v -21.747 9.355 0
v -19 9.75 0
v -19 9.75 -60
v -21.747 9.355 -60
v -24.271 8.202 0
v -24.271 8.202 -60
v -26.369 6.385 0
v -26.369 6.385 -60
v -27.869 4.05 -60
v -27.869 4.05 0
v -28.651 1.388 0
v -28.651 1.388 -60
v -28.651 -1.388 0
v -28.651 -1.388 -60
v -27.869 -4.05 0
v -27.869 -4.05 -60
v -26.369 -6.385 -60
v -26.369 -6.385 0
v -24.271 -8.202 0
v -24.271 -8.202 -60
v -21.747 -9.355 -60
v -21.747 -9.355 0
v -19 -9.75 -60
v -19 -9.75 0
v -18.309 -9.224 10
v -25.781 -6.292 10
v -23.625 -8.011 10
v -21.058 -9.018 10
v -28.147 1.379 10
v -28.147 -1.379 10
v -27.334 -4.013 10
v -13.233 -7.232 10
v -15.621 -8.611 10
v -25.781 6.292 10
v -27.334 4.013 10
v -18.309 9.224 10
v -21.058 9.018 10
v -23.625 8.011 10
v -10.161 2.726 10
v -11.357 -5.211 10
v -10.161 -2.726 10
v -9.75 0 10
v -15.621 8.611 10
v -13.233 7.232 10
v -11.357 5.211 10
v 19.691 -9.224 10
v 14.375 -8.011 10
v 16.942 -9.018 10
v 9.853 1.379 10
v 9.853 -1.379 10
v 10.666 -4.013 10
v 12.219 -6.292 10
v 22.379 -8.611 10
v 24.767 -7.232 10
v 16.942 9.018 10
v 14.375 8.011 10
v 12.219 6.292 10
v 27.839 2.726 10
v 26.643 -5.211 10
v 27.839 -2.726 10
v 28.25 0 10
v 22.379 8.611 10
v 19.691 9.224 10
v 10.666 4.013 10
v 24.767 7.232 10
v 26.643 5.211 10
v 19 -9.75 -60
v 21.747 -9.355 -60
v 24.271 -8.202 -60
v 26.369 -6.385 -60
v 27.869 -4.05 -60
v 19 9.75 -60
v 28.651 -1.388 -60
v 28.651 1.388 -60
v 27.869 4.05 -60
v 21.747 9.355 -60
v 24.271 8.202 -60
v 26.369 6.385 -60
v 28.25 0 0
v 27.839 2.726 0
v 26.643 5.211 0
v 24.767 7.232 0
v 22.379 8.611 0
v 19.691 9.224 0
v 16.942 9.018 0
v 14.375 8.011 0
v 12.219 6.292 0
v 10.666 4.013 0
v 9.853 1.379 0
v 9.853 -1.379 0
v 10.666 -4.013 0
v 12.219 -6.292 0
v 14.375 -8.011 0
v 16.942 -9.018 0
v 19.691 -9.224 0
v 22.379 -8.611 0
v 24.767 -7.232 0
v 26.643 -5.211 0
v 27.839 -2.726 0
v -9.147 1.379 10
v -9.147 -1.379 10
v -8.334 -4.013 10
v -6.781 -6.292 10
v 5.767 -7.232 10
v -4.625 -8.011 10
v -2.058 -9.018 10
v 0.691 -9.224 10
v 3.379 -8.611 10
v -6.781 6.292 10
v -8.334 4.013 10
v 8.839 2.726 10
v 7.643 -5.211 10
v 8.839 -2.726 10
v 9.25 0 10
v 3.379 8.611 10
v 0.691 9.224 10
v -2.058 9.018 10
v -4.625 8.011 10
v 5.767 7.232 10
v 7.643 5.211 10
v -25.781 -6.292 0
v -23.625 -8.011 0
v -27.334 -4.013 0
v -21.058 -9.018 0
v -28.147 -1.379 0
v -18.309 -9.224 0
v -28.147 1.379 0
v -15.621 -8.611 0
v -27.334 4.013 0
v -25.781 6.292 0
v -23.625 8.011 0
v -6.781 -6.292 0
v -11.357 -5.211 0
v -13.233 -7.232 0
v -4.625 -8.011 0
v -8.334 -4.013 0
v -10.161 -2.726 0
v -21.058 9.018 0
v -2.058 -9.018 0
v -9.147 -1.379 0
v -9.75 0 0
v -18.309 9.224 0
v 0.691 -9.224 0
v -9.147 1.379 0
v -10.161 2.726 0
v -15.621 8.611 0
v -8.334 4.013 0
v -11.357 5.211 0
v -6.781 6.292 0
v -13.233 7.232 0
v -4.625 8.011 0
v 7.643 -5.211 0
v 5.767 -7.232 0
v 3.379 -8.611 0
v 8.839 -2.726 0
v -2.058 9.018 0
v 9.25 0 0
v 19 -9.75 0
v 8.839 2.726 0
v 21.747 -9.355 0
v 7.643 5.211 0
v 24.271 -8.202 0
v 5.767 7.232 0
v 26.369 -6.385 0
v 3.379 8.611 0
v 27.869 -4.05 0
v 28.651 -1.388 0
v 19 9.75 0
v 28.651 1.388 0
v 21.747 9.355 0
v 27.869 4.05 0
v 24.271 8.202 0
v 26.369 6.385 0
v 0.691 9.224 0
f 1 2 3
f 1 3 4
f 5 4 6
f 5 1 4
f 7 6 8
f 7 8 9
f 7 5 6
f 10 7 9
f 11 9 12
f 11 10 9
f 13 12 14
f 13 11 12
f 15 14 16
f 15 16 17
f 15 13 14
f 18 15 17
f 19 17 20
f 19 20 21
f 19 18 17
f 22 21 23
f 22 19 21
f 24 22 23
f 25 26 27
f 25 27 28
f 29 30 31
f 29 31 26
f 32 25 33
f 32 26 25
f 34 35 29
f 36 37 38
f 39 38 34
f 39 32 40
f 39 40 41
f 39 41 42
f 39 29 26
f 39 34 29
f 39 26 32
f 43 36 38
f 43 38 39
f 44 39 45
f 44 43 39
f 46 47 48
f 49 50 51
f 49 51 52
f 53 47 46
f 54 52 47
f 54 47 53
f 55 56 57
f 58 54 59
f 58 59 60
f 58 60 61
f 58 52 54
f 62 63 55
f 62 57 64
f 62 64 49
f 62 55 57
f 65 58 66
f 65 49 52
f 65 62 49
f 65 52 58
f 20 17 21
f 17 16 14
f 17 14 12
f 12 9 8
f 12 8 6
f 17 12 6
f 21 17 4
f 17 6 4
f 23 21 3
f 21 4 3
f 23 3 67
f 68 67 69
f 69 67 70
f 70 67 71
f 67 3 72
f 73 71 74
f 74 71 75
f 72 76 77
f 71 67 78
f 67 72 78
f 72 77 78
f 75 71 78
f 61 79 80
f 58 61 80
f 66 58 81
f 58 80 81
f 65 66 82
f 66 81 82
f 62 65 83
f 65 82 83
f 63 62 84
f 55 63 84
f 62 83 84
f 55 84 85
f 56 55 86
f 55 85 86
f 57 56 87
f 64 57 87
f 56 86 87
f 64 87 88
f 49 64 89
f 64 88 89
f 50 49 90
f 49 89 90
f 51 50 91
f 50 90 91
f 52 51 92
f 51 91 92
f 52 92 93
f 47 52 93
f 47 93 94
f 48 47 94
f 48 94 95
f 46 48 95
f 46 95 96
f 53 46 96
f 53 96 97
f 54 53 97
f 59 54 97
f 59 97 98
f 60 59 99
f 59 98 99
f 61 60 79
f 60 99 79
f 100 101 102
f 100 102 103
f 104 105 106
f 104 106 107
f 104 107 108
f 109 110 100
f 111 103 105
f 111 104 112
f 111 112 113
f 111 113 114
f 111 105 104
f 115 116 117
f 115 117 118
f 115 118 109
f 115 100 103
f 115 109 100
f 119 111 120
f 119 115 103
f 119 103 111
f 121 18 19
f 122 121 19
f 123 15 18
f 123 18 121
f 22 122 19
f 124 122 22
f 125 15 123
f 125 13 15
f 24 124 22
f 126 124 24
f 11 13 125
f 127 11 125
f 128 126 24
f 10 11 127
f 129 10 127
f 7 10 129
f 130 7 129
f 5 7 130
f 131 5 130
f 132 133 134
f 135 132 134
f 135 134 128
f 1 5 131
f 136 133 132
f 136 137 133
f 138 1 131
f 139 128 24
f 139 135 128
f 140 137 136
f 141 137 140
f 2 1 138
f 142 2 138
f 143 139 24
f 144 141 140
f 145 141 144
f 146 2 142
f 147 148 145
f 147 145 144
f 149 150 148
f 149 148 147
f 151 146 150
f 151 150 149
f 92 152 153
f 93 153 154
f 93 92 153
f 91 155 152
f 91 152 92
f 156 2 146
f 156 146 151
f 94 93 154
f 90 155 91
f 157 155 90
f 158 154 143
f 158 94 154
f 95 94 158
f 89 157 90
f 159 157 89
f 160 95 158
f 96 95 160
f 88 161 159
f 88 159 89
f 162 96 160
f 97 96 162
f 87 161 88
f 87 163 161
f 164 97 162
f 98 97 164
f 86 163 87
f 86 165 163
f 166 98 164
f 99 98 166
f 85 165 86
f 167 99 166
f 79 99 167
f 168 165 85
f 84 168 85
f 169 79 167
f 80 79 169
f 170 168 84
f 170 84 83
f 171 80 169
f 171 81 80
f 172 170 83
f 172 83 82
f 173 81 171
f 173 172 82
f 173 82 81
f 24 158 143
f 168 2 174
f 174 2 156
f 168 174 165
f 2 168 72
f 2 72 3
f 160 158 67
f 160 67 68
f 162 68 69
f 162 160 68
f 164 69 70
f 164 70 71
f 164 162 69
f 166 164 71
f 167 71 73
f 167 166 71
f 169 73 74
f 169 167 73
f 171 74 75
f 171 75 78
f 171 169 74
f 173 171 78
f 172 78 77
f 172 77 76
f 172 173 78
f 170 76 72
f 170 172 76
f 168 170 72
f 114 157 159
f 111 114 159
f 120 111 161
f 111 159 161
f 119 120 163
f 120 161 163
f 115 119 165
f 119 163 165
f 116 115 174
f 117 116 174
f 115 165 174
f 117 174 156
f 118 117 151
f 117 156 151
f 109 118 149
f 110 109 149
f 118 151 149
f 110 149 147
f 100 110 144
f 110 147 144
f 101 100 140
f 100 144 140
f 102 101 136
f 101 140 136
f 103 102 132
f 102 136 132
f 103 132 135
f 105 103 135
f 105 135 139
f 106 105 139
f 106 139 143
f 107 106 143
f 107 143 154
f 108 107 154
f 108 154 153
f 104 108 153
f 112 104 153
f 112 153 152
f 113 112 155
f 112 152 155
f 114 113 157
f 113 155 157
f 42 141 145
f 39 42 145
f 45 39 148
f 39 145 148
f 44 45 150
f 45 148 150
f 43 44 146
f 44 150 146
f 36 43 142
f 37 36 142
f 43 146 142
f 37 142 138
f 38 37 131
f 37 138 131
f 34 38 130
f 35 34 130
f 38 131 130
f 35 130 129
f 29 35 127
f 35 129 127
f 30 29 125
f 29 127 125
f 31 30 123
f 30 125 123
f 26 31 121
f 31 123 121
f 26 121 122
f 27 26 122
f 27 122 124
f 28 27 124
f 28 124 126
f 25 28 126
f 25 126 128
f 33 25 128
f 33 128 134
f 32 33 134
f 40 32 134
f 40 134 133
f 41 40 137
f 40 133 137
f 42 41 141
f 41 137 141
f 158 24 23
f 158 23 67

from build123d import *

# Parameters (mm, degrees)
SKIZZE1_R                         = 9.25
AUFSATZ_LINEAR_AUSTRAGEN1_DEPTH   = 10
AUFSATZ_LINEAR_AUSTRAGEN1_2_DEPTH = 10
AUFSATZ_LINEAR_AUSTRAGEN1_3_DEPTH = 10
AUFSATZ_LINEAR_AUSTRAGEN7_DEPTH   = 60


with BuildPart() as part:
    # Skizze1 → Aufsatz-Linear austragen1 (new body)
    with BuildSketch(Plane.XY):
        Circle(SKIZZE1_R)
    extrude(amount=AUFSATZ_LINEAR_AUSTRAGEN1_DEPTH)



with BuildPart() as body_2:
    # Skizze1 → Aufsatz-Linear austragen1 2 (new body)
    with BuildSketch(Plane.XY):
        with Locations((19, 0)):
            Circle(SKIZZE1_R)
    extrude(amount=AUFSATZ_LINEAR_AUSTRAGEN1_2_DEPTH)


with BuildPart() as body_3:
    # Skizze1 → Aufsatz-Linear austragen1 3 (new body)
    with BuildSketch(Plane.XY):
        with Locations((-19, 0)):
            Circle(SKIZZE1_R)
    extrude(amount=AUFSATZ_LINEAR_AUSTRAGEN1_3_DEPTH)


with BuildPart() as part_1:
    add(part.part)

    add(body_2.part)  # Aufsatz-Linear austragen7 merges body 2

    add(body_3.part)  # Aufsatz-Linear austragen7 merges body 3
    # Skizze1<5> → Aufsatz-Linear austragen7 (add)
    with BuildSketch(Plane.XY):
        with BuildLine():
            Line((19, 9.75), (-19, 9.75))
            ThreePointArc((-19, 9.75), (-28.75, 0), (-19, -9.75))
            Line((-19, -9.75), (19, -9.75))
            ThreePointArc((19, -9.75), (28.75, 0), (19, 9.75))
        make_face()
    extrude(amount=-AUFSATZ_LINEAR_AUSTRAGEN7_DEPTH)


solid = part_1.part
